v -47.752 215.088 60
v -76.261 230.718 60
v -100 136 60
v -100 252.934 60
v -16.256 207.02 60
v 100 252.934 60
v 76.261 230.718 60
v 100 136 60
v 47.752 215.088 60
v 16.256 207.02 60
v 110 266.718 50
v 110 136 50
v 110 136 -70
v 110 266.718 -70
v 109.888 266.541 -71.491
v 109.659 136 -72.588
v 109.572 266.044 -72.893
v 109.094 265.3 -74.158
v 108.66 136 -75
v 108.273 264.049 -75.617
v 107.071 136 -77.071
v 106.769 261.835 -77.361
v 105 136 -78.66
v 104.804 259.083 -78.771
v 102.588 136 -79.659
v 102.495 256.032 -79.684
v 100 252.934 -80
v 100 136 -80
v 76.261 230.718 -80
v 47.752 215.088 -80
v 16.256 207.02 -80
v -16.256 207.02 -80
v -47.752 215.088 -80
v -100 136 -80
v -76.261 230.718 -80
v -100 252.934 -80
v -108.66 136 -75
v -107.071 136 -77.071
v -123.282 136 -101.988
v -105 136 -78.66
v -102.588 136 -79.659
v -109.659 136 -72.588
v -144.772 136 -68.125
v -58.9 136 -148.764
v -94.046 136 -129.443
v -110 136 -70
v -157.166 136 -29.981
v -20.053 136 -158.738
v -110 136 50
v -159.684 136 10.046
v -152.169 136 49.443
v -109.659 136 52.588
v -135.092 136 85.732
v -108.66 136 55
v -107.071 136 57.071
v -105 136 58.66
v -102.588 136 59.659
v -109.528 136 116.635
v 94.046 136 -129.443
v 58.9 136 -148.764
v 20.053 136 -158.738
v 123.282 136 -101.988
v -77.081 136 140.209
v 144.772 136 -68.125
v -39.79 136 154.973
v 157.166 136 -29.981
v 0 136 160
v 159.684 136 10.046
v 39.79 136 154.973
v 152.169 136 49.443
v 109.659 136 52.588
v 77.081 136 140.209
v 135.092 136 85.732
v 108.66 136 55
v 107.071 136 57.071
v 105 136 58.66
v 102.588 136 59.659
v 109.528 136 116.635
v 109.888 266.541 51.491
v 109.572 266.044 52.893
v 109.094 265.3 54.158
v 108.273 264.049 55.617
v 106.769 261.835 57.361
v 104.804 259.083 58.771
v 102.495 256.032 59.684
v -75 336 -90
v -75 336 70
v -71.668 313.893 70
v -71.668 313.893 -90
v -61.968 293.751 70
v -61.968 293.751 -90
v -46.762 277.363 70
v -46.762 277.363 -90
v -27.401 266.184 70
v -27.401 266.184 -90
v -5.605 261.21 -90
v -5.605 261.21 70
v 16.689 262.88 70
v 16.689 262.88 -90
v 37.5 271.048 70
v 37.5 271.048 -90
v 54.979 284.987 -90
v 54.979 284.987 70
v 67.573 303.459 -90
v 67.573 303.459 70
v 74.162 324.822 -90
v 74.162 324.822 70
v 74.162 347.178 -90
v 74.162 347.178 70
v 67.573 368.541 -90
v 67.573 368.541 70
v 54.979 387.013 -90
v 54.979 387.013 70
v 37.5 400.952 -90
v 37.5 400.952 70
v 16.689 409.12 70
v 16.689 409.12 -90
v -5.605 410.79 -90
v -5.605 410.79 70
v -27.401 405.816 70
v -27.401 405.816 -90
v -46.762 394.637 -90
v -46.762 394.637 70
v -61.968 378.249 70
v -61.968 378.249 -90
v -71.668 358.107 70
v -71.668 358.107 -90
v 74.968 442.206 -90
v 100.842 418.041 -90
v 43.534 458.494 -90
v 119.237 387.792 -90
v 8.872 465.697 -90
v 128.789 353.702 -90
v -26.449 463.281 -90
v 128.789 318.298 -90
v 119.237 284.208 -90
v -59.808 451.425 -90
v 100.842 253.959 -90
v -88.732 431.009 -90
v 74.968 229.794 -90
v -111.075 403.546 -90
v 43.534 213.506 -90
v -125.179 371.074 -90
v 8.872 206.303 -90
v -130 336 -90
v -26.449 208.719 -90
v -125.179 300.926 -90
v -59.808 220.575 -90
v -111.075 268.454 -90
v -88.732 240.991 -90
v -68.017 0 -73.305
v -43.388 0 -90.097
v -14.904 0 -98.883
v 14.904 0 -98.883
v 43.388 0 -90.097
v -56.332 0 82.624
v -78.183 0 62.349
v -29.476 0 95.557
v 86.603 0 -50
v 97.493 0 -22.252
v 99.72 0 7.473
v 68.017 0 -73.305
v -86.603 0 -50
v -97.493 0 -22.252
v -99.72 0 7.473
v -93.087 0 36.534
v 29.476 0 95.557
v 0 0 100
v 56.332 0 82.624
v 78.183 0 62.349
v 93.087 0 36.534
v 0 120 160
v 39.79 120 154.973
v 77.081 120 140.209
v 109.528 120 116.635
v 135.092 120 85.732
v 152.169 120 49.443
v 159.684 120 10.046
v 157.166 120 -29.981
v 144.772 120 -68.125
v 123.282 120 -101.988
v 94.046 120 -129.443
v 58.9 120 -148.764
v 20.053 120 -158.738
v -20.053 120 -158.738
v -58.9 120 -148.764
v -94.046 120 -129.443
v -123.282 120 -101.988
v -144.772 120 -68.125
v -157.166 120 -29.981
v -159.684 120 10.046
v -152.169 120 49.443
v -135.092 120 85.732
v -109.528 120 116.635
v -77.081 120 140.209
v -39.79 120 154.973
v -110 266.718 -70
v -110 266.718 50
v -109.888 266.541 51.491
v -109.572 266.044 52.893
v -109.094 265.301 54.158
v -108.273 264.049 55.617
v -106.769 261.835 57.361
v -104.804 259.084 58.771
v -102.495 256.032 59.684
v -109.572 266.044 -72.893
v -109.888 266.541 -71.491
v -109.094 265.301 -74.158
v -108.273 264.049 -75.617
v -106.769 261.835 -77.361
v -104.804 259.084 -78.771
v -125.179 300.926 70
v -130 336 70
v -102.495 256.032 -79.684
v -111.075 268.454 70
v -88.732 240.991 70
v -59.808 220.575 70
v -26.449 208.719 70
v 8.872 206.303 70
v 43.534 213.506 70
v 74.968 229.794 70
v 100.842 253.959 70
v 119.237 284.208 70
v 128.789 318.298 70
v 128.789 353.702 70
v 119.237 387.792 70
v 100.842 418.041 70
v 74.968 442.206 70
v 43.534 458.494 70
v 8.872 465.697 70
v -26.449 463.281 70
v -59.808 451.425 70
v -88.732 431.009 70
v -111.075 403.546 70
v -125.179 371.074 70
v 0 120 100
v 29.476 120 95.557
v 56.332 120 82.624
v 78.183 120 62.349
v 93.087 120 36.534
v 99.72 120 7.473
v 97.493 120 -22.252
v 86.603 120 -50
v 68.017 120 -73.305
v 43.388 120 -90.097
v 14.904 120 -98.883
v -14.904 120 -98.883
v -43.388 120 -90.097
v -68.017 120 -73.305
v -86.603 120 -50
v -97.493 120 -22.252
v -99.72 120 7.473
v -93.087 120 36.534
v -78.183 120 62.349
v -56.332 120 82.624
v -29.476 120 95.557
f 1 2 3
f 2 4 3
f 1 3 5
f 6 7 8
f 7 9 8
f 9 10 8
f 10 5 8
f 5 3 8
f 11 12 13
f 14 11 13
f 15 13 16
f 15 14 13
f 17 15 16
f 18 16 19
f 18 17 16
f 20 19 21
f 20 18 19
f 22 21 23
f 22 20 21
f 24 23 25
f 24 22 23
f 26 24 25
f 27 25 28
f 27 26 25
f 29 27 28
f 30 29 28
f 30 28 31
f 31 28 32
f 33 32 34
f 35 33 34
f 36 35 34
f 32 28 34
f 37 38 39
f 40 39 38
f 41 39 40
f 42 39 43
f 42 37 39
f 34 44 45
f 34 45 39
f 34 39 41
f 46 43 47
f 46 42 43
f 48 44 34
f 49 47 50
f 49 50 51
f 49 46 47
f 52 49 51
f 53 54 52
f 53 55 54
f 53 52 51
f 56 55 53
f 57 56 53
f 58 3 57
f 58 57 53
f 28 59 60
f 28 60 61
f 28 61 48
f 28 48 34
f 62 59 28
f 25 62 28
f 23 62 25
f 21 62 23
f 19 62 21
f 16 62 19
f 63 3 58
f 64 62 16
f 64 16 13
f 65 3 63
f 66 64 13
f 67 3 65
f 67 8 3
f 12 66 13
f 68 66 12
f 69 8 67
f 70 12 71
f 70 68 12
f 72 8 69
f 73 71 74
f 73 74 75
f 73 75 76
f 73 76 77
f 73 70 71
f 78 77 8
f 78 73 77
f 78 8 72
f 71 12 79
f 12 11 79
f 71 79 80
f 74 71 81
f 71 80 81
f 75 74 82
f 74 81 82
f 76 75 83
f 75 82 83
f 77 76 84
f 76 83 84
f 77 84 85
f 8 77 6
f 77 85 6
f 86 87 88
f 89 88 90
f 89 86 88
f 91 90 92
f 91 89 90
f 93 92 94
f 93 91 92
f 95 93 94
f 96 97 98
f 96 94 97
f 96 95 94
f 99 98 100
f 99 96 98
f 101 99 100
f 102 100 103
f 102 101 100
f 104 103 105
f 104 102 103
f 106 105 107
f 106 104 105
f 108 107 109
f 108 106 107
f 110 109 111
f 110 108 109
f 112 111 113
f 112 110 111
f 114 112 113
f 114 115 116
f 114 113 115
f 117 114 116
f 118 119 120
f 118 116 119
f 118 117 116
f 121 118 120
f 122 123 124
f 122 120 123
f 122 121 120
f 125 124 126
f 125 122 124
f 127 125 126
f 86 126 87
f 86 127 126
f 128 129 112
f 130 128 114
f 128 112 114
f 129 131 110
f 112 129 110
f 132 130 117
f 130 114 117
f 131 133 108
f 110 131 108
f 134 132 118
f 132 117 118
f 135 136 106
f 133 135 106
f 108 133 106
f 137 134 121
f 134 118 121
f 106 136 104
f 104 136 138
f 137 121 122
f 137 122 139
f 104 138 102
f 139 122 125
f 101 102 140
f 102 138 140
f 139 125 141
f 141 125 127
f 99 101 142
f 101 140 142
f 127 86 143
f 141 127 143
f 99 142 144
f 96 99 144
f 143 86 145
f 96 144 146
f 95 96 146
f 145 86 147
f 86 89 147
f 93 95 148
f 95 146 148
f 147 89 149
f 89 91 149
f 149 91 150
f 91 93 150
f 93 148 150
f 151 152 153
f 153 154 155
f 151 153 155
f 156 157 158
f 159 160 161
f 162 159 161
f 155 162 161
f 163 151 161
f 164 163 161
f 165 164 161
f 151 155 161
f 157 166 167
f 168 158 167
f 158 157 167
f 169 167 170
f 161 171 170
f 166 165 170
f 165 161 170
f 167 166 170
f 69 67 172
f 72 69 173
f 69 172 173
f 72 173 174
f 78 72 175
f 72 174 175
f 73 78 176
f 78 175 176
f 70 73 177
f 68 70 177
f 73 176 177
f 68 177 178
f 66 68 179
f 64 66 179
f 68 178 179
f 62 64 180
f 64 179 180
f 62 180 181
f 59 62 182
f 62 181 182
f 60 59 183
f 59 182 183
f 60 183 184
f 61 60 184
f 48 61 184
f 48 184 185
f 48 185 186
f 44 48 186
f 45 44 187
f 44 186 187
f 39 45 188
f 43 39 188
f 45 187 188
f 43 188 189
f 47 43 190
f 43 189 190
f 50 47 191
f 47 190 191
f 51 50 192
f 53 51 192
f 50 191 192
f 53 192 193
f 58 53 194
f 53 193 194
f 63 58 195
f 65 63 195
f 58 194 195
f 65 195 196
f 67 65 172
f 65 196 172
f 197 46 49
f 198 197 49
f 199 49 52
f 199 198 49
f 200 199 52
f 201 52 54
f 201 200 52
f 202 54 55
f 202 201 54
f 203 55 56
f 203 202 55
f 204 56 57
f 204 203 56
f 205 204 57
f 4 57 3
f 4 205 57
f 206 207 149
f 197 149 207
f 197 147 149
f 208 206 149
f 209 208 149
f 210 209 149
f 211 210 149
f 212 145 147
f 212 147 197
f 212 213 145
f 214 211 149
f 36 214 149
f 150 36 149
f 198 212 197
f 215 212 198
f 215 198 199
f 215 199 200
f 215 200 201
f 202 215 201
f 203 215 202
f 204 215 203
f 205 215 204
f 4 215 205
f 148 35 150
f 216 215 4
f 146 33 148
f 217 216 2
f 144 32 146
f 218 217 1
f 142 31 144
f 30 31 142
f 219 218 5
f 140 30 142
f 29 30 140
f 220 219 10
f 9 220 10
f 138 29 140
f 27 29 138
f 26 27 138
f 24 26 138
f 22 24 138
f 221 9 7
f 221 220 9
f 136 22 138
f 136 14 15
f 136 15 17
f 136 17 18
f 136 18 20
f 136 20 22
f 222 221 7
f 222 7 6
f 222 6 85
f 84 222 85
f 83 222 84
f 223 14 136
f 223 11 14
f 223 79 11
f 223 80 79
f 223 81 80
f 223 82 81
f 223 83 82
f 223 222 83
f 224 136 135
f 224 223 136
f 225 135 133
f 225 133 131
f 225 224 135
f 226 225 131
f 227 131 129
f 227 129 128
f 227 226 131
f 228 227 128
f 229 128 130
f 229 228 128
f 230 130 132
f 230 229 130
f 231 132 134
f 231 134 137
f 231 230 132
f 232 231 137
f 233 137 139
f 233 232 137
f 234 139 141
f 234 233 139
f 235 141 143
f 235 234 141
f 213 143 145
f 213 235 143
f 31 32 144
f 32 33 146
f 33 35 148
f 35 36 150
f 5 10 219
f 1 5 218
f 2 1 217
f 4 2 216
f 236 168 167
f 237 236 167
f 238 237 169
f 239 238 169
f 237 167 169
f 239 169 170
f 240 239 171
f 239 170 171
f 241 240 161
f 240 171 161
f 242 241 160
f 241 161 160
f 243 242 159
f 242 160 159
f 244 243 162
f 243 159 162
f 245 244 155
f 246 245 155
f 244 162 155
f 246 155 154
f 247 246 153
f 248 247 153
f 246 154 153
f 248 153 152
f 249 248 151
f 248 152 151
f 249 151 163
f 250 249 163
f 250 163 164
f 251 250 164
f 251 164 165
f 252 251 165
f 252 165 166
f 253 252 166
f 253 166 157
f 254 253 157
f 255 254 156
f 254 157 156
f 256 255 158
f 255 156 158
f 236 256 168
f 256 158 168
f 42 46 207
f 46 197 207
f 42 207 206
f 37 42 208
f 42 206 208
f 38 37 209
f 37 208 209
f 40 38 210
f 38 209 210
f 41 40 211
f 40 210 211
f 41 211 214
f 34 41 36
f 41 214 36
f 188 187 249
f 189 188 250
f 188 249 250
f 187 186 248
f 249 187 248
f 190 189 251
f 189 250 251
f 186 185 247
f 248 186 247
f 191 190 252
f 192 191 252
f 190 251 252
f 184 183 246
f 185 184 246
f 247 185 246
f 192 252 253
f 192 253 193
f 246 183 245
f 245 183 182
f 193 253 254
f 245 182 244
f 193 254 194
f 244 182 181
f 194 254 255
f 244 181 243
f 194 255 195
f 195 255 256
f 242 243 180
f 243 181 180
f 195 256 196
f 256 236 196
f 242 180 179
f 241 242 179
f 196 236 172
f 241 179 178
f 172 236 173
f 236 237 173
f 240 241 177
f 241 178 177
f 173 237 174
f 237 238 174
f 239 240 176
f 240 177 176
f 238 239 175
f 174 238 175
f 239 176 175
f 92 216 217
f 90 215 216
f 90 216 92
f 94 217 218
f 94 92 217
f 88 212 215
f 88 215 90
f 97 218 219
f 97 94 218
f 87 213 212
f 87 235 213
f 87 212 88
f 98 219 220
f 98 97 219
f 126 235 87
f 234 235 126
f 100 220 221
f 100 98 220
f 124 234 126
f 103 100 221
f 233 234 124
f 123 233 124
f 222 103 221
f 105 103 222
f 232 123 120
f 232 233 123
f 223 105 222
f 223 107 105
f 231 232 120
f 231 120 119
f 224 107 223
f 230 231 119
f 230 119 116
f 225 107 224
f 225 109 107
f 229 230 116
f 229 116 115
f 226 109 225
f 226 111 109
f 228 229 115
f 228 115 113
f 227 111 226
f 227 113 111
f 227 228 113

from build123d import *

# Parameters (mm, degrees)
IZIM2_R                          = 100
Y_KSEKLIK_EKSTR_ZYON1_DEPTH      = 120
IZIM3_R                          = 160
Y_KSEKLIK_EKSTR_ZYON2_DEPTH      = 16
IZIM4_R                          = 130
IZIM4_R_2                        = 75
Y_KSEKLIK_EKSTR_ZYON3_DEPTH      = 90
Y_KSEKLIK_EKSTR_ZYON4_REACH      = 402.125
Y_KSEKLIK_EKSTR_ZYON4_END_RADIUS = 130
SKETCH1_R                        = 137.362830178
SKETCH1_R_2                      = 73.465354293
CUT_EXTRUDE1_DEPTH               = 20
FILLET1_R                        = 10
FILLET2_R                        = 10


with BuildPart() as part:
    # Çizim2 → Yükseklik-Ekstrüzyon1 (new body)
    with BuildSketch(Plane(origin=(0, 0, 0), x_dir=(1, 0, 0), z_dir=(0, 1, 0))):
        with Locations(Location((0, 0, 0), (0, 0, 270))):
            Circle(IZIM2_R)
    extrude(amount=Y_KSEKLIK_EKSTR_ZYON1_DEPTH)

    # Çizim3 → Yükseklik-Ekstrüzyon2 (add)
    with BuildSketch(Plane(origin=(0, 120, 0), x_dir=(1, 0, 0), z_dir=(0, 1, 0))):
        with Locations(Location((0, 0, 0), (0, 0, 270))):
            Circle(IZIM3_R)
    extrude(amount=Y_KSEKLIK_EKSTR_ZYON2_DEPTH)



with BuildPart() as body_2:
    # Çizim4 → Yükseklik-Ekstrüzyon3 (new, symmetric)
    with BuildSketch(Plane.XY):
        with Locations(Location((0, 336, 0), (0, 0, 180))):
            Circle(IZIM4_R)
        with Locations(Location((0, 336, 0), (0, 0, 180))):
            Circle(IZIM4_R_2, mode=Mode.SUBTRACT)
    extrude(amount=Y_KSEKLIK_EKSTR_ZYON3_DEPTH, both=True)


with BuildPart() as part_1:
    add(part.part)

    add(body_2.part)  # Yükseklik-Ekstrüzyon4 merges body 2
    # Yükseklik-Ekstrüzyon4: up to this cylinder (the profile starts outside it)
    y_kseklik_ekstr_zyon4_end = Plane(origin=(0, 336, -10), z_dir=(0, 0, -1)) * Cylinder(Y_KSEKLIK_EKSTR_ZYON4_END_RADIUS, 1065.25, mode=Mode.PRIVATE)
    # Çizim6 → Yükseklik-Ekstrüzyon4 (add, up to the surface)
    with BuildSketch(Plane(origin=(0, 136, 0), x_dir=(1, 0, 0), z_dir=(0, 1, 0)), mode=Mode.PRIVATE) as y_kseklik_ekstr_zyon4_sk1:
        Polygon((107.277662826, -60), (110, -60), (110, 80), (-110, 80), (-110, -60), align=None)
    y_kseklik_ekstr_zyon4_tool1 = extrude(y_kseklik_ekstr_zyon4_sk1.sketch, amount=Y_KSEKLIK_EKSTR_ZYON4_REACH, mode=Mode.PRIVATE) - y_kseklik_ekstr_zyon4_end
    add(y_kseklik_ekstr_zyon4_tool1.solids().sort_by_distance((0, 136, -10))[0])

    # Sketch1 → Cut-Extrude1 (cut)
    with BuildSketch(Plane.XY.offset(90)):
        with Locations((0, 334.465354293)):
            Circle(SKETCH1_R)
        with Locations((0, 334.465354293)):
            Circle(SKETCH1_R_2, mode=Mode.SUBTRACT)
    extrude(amount=-CUT_EXTRUDE1_DEPTH, mode=Mode.SUBTRACT)

    # Fillet1
    fillet1_edges = [part_1.edges().sort_by_distance(p)[0] for p in [
        (-110, 201.358983849, 60),
        (110, 201.358983849, 60),
    ]]
    fillet(fillet1_edges, radius=FILLET1_R)

    # Fillet2
    fillet2_edges = [part_1.edges().sort_by_distance(p)[0] for p in [
        (110, 201.358983849, -80),
        (-110, 201.358983849, -80),
    ]]
    fillet(fillet2_edges, radius=FILLET2_R)


solid = part_1.part
